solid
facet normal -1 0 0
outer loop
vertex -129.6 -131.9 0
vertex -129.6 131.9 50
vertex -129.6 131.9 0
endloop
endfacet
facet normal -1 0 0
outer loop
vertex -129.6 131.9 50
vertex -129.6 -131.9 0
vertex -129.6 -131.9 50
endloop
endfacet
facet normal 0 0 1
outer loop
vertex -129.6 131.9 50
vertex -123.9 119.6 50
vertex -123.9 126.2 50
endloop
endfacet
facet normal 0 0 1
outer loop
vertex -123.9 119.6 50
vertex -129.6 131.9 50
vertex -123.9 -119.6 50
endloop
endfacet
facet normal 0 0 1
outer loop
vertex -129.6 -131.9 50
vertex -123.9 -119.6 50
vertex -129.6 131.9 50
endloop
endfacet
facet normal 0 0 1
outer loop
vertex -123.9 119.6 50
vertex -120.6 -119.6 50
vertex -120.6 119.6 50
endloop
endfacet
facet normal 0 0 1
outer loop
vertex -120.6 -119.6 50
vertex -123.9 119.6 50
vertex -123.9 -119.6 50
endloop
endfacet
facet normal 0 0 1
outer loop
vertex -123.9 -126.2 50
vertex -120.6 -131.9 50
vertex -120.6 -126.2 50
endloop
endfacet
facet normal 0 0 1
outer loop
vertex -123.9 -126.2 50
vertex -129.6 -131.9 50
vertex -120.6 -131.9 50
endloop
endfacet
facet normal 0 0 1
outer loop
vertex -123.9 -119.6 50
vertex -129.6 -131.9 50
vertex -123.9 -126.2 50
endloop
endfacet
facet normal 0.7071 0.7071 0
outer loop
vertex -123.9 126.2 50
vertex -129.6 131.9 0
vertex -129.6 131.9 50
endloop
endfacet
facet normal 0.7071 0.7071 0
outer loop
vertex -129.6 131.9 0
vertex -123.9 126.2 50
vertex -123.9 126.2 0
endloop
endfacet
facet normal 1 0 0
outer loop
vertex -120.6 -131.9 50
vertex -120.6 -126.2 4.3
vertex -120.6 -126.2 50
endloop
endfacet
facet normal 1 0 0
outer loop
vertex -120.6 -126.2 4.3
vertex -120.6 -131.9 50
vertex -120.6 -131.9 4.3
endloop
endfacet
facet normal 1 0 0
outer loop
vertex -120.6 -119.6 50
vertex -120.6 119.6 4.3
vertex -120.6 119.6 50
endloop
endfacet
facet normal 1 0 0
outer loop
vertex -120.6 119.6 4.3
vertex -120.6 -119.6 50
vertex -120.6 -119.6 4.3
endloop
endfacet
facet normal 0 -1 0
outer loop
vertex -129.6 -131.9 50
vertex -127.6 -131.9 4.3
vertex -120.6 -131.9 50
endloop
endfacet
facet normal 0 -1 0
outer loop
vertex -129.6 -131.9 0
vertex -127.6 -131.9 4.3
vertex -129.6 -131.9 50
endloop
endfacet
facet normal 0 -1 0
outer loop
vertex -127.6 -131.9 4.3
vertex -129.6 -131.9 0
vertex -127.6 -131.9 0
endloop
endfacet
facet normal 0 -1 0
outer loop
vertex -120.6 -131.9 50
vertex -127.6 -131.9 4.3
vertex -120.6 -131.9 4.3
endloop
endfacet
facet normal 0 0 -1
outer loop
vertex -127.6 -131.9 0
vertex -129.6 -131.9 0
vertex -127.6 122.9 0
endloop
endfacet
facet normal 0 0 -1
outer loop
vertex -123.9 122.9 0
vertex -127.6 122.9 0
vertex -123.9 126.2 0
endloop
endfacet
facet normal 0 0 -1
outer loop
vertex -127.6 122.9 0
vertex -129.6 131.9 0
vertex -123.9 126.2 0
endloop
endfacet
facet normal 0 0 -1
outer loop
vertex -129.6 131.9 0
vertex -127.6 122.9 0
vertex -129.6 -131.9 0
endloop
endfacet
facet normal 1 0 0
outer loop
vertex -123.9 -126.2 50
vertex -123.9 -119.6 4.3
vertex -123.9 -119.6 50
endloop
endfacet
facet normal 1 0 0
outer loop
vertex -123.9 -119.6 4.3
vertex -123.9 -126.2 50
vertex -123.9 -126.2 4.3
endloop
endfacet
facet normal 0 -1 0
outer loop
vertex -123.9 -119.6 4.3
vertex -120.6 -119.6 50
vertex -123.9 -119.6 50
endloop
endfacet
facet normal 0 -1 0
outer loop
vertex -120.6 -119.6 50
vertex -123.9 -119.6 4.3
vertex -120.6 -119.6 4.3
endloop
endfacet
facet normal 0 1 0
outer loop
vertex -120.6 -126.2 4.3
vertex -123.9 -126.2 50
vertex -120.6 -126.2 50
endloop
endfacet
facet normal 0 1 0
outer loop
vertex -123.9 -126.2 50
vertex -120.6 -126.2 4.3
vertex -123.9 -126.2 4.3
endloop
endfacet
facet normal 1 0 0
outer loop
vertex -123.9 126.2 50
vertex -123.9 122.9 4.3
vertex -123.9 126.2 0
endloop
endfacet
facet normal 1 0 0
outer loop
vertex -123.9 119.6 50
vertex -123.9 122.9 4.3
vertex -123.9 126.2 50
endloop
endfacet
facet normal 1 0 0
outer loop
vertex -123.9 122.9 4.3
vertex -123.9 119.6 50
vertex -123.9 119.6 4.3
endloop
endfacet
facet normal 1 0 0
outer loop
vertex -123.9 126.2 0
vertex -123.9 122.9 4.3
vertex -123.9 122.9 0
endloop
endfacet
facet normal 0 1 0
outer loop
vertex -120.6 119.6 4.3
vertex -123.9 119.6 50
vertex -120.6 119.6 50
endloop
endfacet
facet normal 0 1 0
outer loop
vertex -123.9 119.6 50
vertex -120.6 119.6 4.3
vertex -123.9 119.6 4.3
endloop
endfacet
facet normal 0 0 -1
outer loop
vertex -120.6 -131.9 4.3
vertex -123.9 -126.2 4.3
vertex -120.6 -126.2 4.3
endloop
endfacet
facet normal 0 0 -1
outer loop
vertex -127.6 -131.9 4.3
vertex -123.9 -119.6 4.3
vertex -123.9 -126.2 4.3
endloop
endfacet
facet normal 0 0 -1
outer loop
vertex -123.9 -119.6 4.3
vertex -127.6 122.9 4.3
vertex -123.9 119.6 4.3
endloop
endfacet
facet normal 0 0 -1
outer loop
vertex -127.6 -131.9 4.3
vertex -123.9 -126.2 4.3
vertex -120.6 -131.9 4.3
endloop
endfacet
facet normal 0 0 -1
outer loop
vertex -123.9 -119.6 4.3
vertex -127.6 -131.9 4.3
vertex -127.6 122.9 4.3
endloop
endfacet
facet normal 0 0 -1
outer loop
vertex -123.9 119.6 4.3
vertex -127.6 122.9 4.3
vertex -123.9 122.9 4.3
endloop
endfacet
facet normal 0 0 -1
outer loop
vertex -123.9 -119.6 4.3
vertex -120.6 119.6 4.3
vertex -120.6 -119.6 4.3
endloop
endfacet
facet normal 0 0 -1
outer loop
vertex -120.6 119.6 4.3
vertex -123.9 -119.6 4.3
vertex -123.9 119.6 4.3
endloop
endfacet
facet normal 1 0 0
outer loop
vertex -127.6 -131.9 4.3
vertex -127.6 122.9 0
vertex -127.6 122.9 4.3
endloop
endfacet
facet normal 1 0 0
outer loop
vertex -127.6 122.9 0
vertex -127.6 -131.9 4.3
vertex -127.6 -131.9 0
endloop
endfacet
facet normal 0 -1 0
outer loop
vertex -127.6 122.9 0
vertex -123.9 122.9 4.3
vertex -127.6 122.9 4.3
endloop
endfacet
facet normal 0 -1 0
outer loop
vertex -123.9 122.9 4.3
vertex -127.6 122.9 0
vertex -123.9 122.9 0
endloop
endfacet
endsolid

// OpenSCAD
// WheresDat — Shelf side wall (left or right), split out from the
// original fused floor+3-walls design in shelf.scad. Large flat floor
// fused to tall thin walls was warping badly — this splits the shelf
// into 4 printed parts (this side wall x2, shelf_back.scad, and
// shelf_floor.scad) so each piece has a much simpler, more uniform
// cross-section.
//
// Runs the full front-to-back depth. The back end is sliced diagonally
// exactly through the post socket's center (not through solid wall
// material) — the socket is always split at exactly 45 degrees here,
// since both the left/right wall and the back wall shift by the same
// wall_thickness in x and y at that corner. shelf_back.scad has the
// matching cut, so the two halves recombine into the full 6.6mm post
// socket once assembled, and the corner post itself pins the seam once
// glued in.
//
// The floor is now shelf_floor.scad, not fused here — this wall's own
// bottom sits flush on the floor's top surface, and a groove is cut
// straight up into the bottom-inner corner from there (not into the
// floor's body) for a raised tongue on shelf_floor.scad's edge to glue
// into. Outer band stays solid the whole way down, same as before.
//
// Supersedes shelf.scad. Not yet rendered/validated — open in the app
// and test-fit one corner (post through both halves' sockets, floor
// glued into the rabbet) before committing to a full run of 8.

/* [Printer] */
max_footprint = 280; // mm

/* [Which side — mirrors the same geometry in x] */
side = "left"; // [left,right]

/* [Post geometry — must match shelf_floor.scad and shelf_back.scad] */
post_size      = 6;   // mm, square cross-section
post_clearance = 0.3; // mm, per-side fit clearance

/* [Footprint — must match shelf_floor.scad and shelf_back.scad] */
post_spacing_x = 241.2; // mm
post_spacing_y = 245.8; // mm

/* [Wall construction — must match shelf_back.scad] */
min_wall       = 3;  // mm
wall_thickness = post_size + min_wall; // 9mm
wall_height    = 50; // mm

/* [Floor tongue groove — must match shelf_back.scad; rabbet_height must
   equal shelf_floor.scad's tongue_height + tongue_clearance] */
floor_thickness  = 4;   // mm — not used for sizing the groove itself (see
                          // rabbet_height below), only kept for reference/
                          // consistency with the other files
rabbet_clearance = 0.3; // mm — this is the TONGUE's clearance (shelf_floor.scad's
                          // tongue_clearance), named for the groove it cuts here
// Bumped up from an initial 6mm — more glue surface, and cheap to give
// since the groove only occupies the low rabbet_height band, not the
// wall's full height. Leaves wall_thickness - rabbet_depth = 2mm of
// solid material outward of the groove in that band, which is fine for a
// short continuous lip (not a thin unsupported column).
rabbet_depth  = 7; // mm, inward from the wall's inner face
// Height of the groove cut UP from this wall's own bottom (which sits on
// the floor's top surface) — must equal shelf_floor.scad's
// tongue_height (4) + tongue_clearance (0.3), NOT floor_thickness.
// Numerically the same (4 + 0.3 = 4.3) purely because that's what was
// picked for both; the groove has nothing to do with floor_thickness.
rabbet_height = 4.3;

assert(rabbet_depth < wall_thickness,
    str("rabbet_depth (", rabbet_depth, "mm) must leave solid wall material outward of the notch (wall_thickness = ", wall_thickness, "mm)"));

// ---------------------------------------------------------------------
// Derived geometry — shouldn't need editing below this line
// ---------------------------------------------------------------------

floor_x = post_spacing_x + 2 * wall_thickness;
floor_y = post_spacing_y + 2 * wall_thickness;

assert(floor_x <= max_footprint,
    str("Shelf X (", floor_x, "mm) exceeds max_footprint (", max_footprint, "mm)"));
assert(floor_y <= max_footprint,
    str("Shelf Y (", floor_y, "mm) exceeds max_footprint (", max_footprint, "mm)"));

half_fx = floor_x / 2;
half_fy = floor_y / 2;

// Inner face x / diagonal cut point — dead center of the back corner's
// post socket, same point used by shelf_back.scad's matching cut.
inner_x = post_spacing_x / 2;
diag_y  = post_spacing_y / 2;

module post_socket(x, y) {
    translate([x, y, wall_height / 2])
        cube([post_size + 2 * post_clearance, post_size + 2 * post_clearance, wall_height + 1], center = true);
}

module floor_rabbet() {
    // Notch along the wall's full straight inner run, front face to the
    // start of the back diagonal. Overshoots both the front face (open
    // part boundary) and the inner face (coincident with the polygon's
    // own edge) by 0.5mm for a clean boolean.
    inner_run_length = floor_y - wall_thickness;
    translate([-half_fx + wall_thickness - rabbet_depth, -half_fy - 0.5, -0.5])
        cube([rabbet_depth + 0.5, inner_run_length + 0.5, rabbet_height + 0.5]);
}

module shelf_side_left() {
    difference() {
        linear_extrude(height = wall_height)
            polygon([
                [-half_fx, -half_fy], // front-outer
                [-half_fx, half_fy],  // back-outer
                [-inner_x, diag_y],   // diagonal cut point = post socket center
                [-inner_x, -half_fy]  // front-inner
            ]);

        post_socket(-inner_x, -diag_y); // front corner
        post_socket(-inner_x, diag_y);  // back corner — this wall's half of the socket

        floor_rabbet();
    }
}

module shelf_side() {
    if (side == "right") {
        mirror([1, 0, 0]) shelf_side_left();
    } else {
        shelf_side_left();
    }
}

shelf_side();
